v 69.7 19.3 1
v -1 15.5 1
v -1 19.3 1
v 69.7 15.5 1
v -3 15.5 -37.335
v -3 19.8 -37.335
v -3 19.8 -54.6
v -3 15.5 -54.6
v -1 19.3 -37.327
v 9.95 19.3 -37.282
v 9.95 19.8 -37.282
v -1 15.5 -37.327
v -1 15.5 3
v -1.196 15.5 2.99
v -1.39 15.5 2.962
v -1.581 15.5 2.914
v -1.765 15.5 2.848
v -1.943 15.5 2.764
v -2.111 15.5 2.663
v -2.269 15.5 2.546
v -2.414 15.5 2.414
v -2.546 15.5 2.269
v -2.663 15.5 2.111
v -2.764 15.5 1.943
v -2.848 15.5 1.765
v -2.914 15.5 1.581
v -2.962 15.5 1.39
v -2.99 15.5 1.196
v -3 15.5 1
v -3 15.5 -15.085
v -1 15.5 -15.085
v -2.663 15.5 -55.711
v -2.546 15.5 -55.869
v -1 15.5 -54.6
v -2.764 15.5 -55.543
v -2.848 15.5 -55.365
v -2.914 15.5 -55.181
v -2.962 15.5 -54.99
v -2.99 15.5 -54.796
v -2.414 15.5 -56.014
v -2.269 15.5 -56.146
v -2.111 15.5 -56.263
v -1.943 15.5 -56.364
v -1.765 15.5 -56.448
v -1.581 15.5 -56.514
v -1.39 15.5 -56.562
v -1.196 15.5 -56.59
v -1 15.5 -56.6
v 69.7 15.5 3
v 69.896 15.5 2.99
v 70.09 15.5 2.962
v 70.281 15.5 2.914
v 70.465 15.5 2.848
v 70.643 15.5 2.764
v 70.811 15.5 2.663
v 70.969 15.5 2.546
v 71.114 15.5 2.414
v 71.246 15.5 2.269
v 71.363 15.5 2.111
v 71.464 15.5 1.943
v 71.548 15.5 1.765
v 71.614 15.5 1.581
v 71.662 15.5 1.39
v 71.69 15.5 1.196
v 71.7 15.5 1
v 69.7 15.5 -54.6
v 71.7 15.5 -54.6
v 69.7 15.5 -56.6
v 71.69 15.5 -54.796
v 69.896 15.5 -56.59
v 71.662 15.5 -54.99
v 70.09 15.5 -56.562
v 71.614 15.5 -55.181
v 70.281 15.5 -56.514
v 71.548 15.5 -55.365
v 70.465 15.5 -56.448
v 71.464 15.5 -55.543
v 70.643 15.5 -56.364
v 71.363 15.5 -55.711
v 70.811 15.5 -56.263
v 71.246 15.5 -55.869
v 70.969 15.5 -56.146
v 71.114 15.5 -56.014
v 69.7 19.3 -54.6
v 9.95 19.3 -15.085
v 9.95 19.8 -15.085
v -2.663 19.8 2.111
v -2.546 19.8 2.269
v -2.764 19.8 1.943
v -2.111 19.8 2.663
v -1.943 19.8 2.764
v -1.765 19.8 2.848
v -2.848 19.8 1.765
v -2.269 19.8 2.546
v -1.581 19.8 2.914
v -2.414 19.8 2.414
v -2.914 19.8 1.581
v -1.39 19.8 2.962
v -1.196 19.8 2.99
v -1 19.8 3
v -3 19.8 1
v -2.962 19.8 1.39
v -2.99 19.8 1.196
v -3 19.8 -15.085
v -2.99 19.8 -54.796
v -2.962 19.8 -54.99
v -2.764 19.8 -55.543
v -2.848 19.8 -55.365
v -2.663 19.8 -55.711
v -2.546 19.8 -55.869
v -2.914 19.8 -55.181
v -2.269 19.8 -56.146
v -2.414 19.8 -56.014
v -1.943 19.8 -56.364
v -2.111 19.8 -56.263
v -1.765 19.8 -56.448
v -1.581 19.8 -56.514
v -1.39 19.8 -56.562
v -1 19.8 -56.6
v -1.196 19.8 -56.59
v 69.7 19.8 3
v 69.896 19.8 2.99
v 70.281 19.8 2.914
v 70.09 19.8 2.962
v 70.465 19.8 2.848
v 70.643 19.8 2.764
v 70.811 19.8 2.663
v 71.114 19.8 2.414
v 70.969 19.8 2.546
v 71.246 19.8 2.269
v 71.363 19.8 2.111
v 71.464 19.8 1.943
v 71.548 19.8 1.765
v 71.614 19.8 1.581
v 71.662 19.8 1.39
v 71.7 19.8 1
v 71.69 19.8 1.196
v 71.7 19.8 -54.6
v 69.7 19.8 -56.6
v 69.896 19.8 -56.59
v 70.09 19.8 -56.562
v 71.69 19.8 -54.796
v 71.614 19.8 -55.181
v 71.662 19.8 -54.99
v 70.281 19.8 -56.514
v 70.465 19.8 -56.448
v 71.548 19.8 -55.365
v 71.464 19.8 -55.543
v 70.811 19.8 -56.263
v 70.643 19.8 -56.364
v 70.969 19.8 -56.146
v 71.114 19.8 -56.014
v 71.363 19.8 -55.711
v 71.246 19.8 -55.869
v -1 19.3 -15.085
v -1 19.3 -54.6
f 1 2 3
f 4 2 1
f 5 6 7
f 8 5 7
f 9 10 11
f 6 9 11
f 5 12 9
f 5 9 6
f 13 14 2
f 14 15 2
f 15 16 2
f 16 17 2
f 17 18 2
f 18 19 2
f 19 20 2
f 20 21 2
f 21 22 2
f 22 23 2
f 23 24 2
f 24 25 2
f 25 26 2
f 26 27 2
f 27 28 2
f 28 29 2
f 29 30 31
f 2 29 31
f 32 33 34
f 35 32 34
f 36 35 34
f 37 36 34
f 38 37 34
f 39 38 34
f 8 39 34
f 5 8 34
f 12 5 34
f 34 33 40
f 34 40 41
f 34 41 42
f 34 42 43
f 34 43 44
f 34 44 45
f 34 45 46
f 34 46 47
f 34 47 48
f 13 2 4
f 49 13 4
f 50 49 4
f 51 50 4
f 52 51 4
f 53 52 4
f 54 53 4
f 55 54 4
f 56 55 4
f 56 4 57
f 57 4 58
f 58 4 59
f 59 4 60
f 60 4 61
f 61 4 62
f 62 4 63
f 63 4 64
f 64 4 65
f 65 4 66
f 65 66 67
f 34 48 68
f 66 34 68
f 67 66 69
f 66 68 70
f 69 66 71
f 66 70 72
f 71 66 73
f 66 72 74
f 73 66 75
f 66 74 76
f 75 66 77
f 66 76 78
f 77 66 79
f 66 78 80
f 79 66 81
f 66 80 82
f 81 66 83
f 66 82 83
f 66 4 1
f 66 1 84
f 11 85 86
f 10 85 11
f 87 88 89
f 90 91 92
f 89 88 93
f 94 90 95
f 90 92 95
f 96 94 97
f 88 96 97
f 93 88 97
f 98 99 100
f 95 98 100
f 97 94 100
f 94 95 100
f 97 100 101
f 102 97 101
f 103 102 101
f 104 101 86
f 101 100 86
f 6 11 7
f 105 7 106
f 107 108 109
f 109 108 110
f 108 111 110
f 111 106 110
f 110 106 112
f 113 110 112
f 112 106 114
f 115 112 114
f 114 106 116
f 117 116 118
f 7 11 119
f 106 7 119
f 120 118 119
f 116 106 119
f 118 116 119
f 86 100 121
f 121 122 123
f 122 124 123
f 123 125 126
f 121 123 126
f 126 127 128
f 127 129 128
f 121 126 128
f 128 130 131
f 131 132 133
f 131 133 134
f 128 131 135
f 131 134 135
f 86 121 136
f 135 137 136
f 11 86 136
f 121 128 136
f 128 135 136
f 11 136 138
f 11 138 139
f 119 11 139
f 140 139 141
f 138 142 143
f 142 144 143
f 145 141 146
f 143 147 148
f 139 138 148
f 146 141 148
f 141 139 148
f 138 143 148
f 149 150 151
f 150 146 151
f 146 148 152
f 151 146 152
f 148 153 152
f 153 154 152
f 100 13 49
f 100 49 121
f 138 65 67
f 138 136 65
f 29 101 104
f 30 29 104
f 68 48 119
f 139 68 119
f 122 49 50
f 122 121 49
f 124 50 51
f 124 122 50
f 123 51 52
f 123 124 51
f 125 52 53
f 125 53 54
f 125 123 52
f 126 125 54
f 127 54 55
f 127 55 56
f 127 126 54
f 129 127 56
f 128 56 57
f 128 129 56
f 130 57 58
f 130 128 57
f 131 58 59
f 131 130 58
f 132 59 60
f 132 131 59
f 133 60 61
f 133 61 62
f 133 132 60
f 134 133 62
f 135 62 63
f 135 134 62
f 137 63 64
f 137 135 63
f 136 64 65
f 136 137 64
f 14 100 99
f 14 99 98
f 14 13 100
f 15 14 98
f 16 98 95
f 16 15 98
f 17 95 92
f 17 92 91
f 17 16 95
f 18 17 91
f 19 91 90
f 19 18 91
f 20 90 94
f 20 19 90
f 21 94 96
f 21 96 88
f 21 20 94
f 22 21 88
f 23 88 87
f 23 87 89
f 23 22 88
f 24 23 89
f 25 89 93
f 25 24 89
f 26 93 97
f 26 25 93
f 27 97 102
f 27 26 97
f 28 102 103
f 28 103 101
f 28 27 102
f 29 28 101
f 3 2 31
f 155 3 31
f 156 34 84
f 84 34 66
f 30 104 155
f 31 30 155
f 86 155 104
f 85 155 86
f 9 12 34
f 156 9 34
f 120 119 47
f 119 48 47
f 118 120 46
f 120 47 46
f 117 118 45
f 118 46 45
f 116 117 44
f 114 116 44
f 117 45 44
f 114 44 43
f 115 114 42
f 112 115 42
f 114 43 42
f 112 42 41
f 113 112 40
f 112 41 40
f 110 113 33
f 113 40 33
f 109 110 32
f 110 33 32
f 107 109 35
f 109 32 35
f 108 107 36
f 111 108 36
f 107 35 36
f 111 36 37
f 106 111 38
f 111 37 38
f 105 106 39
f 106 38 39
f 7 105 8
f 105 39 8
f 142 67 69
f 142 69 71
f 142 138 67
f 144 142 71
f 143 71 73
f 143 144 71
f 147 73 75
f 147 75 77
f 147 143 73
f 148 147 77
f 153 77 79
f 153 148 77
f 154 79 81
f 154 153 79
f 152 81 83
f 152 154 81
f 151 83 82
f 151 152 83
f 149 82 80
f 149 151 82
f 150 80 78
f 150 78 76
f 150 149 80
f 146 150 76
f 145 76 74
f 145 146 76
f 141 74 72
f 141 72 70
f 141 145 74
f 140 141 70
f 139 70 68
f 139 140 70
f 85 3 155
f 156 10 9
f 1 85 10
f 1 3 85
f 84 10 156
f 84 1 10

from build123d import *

# Parameters (mm, degrees)
SKETCH2_W           = 74.7
SKETCH2_H           = 59.6
SKETCH2_W_2         = 70.7
SKETCH2_H_2         = 55.6
WALLS_DEPTH         = 3.8
SKETCH3_W           = 59.6
SKETCH3_H           = 0.5
BOSS_EXTRUDE2_DEPTH = 74.7
CUT_EXTRUDE1_REACH  = 93.449
FILLET1_R           = 2


with BuildPart() as part:
    # Sketch2 → walls (new body)
    with BuildSketch(Plane(origin=(0, 15.5, 0), x_dir=(1, 0, 0), z_dir=(0, 1, 0))):
        with Locations((34.35, 26.8)):
            Rectangle(SKETCH2_W, SKETCH2_H)
        with Locations((34.35, 26.8)):
            Rectangle(SKETCH2_W_2, SKETCH2_H_2, mode=Mode.SUBTRACT)
    extrude(amount=WALLS_DEPTH)

    # Sketch3 → Boss-Extrude2 (add)
    with BuildSketch(Plane(origin=(71.7, 0, 0), x_dir=(0, 0, -1), z_dir=(1, 0, 0))):
        with Locations((26.8, 19.55)):
            Rectangle(SKETCH3_W, SKETCH3_H)
    extrude(amount=-BOSS_EXTRUDE2_DEPTH)

    # Sketch4 → Cut-Extrude1 (cut, up to next)
    with BuildSketch(Plane(origin=(0, 15.5, 0), x_dir=(1, 0, 0), z_dir=(0, 1, 0)), mode=Mode.PRIVATE) as cut_extrude1_sk1:
        Polygon((9.95, 37.282193212), (-3, 37.335), (-3, 15.085), (9.95, 15.085), align=None)
    cut_extrude1_tool1 = extrude(cut_extrude1_sk1.sketch, amount=CUT_EXTRUDE1_REACH, mode=Mode.PRIVATE) & part.part
    add(cut_extrude1_tool1.solids().sort_by_distance((3.472436, 15.5, -26.196804))[0], mode=Mode.SUBTRACT)

    # Fillet1
    fillet1_edges = [part.edges().sort_by_distance(p)[0] for p in [
        (71.7, 17.65, -56.6),
        (71.7, 17.65, 3),
        (-3, 17.65, 3),
        (-3, 17.65, -56.6),
    ]]
    fillet(fillet1_edges, radius=FILLET1_R)


solid = part.part
